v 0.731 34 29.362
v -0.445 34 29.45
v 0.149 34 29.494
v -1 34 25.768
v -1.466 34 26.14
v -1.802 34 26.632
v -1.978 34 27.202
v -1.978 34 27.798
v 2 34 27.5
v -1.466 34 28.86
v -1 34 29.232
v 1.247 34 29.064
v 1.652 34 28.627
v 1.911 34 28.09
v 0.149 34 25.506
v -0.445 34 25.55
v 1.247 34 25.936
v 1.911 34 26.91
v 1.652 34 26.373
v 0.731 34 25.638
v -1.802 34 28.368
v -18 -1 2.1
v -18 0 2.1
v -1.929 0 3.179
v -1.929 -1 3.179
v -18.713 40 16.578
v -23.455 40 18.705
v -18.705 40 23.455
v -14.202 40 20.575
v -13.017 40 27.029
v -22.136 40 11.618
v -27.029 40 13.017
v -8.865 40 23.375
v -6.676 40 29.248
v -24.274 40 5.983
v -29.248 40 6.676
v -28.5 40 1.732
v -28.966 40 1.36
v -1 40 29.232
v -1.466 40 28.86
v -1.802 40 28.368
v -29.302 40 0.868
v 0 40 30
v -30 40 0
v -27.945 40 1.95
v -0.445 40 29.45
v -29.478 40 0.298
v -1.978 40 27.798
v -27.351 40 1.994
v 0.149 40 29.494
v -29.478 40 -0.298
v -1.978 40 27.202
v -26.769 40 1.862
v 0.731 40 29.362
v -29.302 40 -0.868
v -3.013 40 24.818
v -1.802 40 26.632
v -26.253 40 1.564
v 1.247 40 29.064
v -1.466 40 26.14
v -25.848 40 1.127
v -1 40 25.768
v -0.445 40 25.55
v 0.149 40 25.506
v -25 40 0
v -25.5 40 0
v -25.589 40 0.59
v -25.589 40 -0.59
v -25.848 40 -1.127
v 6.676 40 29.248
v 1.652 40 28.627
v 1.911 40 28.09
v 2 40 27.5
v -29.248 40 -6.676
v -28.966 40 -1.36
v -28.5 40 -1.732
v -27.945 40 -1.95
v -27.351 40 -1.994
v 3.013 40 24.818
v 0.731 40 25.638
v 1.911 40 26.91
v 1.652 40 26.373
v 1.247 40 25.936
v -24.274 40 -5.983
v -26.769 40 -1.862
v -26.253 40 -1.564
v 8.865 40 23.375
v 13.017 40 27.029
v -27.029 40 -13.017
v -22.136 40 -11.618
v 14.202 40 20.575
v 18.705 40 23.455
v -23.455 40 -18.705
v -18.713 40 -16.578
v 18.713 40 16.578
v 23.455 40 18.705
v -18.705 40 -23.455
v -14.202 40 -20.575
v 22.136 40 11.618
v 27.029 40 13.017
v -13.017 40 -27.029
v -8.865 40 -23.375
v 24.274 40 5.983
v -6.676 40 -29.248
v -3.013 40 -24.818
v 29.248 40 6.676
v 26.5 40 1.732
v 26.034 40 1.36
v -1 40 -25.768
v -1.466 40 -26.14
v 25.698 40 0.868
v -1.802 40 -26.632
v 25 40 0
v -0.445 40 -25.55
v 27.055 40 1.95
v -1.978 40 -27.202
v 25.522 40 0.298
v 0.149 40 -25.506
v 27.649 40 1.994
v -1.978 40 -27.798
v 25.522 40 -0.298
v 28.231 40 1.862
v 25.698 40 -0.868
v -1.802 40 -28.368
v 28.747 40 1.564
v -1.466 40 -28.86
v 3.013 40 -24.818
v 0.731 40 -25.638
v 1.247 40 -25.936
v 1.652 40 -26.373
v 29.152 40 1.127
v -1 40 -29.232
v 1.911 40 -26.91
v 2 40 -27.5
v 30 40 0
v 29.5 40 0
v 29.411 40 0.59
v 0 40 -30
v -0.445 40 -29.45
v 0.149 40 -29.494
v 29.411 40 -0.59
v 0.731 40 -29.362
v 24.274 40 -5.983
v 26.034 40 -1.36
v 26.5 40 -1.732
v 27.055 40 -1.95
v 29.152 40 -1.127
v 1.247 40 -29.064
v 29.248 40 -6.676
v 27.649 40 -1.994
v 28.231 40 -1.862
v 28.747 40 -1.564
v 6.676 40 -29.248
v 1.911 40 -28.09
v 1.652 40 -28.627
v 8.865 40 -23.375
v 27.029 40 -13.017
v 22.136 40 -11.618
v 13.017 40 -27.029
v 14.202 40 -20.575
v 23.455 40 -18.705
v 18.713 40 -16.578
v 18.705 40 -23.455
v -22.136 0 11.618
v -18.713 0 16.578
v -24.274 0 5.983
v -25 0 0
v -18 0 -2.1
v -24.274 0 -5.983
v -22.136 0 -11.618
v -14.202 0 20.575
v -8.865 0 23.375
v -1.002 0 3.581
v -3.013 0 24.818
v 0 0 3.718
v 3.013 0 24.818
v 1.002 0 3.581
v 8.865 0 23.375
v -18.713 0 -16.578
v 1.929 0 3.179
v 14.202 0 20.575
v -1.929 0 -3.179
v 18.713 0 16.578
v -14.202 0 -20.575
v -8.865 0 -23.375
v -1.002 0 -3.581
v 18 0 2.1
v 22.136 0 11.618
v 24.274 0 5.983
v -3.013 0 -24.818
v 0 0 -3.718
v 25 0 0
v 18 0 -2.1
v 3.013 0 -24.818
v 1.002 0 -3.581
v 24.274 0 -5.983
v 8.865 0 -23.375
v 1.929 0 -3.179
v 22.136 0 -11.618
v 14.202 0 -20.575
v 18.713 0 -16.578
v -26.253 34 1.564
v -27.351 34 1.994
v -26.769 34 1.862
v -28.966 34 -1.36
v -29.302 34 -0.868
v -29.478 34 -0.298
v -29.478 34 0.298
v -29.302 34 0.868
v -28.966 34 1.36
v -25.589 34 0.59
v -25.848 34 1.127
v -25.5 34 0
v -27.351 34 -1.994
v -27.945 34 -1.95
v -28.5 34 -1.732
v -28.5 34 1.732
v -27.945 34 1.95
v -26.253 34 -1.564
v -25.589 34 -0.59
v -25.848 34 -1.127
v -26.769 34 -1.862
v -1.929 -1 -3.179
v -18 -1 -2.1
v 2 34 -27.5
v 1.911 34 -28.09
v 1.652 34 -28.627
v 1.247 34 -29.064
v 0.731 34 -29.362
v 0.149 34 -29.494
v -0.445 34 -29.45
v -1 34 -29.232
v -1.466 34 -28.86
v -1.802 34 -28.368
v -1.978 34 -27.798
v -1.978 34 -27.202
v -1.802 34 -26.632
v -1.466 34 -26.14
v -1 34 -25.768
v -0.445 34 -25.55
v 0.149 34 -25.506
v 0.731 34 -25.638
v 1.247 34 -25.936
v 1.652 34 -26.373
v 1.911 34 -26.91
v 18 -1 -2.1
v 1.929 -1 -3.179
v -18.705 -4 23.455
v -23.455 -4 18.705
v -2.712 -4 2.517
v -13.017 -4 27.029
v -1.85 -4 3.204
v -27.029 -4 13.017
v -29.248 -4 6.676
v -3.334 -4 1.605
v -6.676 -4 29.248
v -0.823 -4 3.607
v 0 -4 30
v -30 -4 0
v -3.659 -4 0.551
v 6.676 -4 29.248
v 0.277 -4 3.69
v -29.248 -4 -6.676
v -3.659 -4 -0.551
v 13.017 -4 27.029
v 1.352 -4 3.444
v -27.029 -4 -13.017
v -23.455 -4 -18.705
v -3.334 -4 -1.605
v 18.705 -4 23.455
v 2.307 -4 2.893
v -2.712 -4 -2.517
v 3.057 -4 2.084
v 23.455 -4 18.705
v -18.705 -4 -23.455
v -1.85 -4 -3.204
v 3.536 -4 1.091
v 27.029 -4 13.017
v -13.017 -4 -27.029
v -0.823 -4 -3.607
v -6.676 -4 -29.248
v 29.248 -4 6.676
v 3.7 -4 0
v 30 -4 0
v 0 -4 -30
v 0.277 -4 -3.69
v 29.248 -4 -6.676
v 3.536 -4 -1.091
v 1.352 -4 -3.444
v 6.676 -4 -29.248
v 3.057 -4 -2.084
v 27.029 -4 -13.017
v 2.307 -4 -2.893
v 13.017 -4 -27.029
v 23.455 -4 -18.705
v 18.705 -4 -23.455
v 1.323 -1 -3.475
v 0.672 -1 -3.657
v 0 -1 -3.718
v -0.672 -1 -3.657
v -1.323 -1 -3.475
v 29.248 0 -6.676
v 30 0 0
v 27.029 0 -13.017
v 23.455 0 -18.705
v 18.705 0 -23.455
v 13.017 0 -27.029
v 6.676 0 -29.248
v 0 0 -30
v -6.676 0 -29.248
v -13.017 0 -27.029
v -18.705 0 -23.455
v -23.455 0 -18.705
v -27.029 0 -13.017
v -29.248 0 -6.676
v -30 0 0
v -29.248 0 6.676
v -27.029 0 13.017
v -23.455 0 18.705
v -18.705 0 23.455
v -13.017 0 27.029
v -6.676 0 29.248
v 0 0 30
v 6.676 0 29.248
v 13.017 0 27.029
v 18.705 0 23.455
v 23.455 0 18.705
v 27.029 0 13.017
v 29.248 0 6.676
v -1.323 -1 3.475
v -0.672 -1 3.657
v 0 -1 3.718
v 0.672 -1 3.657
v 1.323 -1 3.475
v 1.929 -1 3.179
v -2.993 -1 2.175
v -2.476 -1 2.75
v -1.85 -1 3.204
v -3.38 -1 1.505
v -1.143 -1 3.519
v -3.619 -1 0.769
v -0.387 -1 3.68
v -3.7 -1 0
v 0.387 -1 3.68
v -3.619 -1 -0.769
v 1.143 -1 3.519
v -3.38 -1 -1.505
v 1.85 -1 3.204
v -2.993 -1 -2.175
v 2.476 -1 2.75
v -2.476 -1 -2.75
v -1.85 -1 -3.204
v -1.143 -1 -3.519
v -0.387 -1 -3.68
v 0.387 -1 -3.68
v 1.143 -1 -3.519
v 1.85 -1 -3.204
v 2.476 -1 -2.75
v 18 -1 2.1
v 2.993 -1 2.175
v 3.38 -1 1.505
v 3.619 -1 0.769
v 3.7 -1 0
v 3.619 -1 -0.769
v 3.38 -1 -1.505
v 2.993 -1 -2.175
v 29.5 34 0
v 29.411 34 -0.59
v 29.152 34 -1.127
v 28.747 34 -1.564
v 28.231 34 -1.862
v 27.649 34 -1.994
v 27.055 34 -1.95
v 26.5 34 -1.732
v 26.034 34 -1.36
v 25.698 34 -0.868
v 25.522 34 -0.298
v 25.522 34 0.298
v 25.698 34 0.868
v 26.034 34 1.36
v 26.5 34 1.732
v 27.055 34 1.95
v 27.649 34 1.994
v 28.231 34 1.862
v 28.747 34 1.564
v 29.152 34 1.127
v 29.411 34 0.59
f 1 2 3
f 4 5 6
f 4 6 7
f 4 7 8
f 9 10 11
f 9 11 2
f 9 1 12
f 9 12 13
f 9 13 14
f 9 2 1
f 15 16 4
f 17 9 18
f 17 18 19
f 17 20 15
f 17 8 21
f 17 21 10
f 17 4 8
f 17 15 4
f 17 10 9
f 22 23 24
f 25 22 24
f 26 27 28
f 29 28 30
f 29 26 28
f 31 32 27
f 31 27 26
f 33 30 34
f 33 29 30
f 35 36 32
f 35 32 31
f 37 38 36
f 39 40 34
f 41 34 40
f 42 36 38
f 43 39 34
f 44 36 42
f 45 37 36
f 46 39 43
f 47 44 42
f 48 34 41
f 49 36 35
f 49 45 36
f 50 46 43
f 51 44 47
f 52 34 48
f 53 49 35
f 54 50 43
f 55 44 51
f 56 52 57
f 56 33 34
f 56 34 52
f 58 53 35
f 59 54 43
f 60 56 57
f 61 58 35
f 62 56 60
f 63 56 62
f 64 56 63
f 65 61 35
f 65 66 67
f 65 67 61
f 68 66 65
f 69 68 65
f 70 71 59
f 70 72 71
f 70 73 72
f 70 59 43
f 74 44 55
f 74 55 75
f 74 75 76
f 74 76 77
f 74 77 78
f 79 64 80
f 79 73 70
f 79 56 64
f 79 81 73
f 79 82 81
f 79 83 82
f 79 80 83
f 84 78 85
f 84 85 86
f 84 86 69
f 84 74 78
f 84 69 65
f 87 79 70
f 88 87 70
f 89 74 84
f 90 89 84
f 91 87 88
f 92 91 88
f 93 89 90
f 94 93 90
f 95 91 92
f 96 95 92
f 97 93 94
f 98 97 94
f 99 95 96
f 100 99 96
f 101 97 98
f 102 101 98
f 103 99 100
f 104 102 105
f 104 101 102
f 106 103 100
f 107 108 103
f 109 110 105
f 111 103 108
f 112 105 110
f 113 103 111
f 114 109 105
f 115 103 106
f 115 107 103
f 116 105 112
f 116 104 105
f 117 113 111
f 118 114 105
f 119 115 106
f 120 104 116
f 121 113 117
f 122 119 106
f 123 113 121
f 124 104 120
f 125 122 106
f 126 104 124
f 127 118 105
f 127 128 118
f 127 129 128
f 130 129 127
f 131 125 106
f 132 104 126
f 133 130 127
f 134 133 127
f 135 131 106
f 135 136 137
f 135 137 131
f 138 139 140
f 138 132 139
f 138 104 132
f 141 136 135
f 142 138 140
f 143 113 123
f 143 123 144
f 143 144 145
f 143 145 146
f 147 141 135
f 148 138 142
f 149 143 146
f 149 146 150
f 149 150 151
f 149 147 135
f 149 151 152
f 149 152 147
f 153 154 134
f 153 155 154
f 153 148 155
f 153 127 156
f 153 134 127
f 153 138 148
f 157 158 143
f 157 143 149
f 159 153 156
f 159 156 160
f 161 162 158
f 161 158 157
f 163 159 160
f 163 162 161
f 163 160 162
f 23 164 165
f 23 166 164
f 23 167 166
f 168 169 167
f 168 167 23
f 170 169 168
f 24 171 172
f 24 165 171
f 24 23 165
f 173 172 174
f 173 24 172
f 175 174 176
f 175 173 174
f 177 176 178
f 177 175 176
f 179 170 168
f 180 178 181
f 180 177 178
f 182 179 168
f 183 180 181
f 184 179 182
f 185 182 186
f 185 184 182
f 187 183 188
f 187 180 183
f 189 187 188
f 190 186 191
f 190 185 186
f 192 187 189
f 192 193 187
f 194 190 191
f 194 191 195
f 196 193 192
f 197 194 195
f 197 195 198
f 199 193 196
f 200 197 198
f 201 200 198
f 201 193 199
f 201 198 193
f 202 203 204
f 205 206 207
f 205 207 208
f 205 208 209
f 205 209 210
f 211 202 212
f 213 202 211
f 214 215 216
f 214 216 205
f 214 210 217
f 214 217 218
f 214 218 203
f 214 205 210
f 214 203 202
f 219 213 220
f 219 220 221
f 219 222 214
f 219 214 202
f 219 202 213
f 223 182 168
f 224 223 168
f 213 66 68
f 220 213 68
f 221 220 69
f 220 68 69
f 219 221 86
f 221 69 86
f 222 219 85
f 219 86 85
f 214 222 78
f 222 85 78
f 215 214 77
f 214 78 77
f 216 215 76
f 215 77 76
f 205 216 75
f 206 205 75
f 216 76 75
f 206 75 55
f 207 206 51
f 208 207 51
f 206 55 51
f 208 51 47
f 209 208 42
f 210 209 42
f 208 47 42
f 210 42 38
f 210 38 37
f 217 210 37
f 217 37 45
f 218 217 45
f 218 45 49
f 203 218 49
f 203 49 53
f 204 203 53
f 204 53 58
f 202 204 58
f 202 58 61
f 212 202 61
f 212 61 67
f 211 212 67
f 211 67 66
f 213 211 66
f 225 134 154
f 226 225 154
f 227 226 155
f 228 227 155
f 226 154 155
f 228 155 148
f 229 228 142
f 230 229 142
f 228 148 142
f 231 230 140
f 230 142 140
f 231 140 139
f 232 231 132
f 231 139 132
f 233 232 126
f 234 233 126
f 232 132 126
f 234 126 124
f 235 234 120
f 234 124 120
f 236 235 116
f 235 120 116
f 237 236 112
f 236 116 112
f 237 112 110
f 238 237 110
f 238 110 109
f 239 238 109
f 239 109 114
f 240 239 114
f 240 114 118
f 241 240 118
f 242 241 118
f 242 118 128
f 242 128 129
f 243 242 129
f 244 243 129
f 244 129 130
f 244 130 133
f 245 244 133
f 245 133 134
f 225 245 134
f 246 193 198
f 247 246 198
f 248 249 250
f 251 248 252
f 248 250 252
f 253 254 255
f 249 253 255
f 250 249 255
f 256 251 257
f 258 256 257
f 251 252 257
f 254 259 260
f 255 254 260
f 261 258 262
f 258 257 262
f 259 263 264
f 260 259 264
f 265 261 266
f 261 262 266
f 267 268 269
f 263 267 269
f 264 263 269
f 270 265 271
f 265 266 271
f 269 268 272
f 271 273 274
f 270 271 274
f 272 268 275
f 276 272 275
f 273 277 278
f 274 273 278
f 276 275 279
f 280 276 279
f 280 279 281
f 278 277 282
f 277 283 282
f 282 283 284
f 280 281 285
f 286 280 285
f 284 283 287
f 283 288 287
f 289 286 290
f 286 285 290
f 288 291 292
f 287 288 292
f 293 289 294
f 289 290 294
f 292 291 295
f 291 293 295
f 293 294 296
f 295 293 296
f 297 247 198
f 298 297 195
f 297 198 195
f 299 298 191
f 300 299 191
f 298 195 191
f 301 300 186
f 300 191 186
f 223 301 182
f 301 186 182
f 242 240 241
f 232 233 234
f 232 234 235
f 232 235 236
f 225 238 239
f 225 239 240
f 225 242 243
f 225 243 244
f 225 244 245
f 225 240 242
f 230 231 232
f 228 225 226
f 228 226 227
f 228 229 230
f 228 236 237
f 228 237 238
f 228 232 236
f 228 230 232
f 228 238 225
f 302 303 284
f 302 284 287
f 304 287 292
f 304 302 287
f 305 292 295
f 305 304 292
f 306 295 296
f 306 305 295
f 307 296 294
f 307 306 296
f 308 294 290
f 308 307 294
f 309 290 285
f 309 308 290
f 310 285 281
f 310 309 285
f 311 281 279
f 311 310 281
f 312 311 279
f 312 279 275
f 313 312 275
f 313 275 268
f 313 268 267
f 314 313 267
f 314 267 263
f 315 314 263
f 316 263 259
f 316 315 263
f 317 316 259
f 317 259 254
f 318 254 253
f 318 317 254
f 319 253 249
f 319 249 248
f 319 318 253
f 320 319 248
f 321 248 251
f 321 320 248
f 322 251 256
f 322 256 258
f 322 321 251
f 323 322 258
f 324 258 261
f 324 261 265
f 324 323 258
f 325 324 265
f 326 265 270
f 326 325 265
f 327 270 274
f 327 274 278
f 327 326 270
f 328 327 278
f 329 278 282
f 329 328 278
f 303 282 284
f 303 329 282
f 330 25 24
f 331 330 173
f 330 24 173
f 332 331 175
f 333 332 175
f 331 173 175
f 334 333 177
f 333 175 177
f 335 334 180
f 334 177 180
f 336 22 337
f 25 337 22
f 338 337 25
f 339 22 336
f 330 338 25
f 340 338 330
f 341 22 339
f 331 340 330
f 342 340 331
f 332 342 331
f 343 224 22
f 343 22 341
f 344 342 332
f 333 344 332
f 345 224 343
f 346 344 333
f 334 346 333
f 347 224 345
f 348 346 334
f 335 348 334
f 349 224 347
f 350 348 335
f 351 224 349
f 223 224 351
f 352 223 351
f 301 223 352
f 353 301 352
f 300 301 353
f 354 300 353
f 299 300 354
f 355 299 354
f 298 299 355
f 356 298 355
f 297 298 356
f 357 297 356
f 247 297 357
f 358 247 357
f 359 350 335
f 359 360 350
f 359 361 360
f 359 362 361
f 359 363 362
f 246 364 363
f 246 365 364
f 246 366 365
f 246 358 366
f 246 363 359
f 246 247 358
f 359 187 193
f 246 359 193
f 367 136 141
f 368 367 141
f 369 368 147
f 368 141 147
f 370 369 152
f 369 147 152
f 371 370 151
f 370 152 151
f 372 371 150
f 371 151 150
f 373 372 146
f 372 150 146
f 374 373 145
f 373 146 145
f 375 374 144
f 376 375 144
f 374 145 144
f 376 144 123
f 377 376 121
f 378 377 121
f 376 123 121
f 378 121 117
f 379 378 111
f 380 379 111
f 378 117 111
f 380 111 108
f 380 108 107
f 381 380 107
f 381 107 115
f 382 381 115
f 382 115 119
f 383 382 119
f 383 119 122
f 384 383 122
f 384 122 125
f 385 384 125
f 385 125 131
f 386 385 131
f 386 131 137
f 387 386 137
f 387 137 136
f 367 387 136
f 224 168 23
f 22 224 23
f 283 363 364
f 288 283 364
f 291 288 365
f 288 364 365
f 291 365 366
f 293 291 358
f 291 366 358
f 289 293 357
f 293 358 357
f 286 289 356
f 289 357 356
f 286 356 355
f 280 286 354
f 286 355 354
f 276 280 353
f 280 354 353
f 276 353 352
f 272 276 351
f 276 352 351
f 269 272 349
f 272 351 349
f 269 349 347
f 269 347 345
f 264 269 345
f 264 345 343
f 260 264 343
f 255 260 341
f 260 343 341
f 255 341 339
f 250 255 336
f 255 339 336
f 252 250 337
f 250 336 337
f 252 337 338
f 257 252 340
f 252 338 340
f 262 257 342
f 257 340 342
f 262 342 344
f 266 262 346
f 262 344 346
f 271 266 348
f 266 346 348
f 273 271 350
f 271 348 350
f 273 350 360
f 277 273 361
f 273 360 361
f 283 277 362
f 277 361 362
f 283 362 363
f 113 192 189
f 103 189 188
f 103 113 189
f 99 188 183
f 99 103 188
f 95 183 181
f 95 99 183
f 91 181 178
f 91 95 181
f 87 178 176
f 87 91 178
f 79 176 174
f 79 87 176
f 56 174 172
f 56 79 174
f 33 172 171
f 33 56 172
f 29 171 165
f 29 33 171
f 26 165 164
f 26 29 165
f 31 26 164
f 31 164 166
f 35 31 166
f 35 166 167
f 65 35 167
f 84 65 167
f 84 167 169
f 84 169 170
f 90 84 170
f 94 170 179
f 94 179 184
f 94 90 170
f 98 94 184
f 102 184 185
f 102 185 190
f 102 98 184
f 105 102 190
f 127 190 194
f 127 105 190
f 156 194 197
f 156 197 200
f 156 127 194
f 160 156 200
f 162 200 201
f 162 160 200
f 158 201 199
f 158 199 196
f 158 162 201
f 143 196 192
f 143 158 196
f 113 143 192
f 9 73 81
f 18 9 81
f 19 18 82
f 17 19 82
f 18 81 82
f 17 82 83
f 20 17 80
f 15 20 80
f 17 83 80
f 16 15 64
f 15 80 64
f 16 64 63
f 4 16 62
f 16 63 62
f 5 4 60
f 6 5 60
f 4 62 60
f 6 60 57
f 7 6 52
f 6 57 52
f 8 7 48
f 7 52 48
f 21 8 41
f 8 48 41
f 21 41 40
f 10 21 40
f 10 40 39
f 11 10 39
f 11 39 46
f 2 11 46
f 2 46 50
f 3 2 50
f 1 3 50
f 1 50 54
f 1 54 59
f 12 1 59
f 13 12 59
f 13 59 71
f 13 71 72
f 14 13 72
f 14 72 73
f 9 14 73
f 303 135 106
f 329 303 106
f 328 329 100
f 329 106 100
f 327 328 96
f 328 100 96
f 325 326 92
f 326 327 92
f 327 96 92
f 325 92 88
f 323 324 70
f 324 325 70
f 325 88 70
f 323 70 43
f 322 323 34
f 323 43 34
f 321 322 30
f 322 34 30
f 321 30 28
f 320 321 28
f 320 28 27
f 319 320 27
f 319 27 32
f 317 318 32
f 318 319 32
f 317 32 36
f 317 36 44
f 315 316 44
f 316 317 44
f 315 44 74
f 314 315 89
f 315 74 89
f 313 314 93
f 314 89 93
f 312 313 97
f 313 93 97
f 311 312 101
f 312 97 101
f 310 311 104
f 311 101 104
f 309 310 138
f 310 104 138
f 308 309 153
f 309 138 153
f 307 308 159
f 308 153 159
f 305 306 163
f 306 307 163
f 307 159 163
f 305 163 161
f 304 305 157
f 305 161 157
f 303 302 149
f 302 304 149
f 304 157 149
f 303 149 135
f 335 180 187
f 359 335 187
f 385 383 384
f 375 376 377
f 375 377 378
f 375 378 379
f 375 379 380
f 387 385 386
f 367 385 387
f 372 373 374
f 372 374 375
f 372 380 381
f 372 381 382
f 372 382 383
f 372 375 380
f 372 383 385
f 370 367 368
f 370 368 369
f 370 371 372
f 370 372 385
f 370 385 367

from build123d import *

# Parameters (mm, degrees)
CROQUIS2_R              = 30
SALIENTE_EXTRUIR1_DEPTH = 4
CORTAR_EXTRUIR1_DEPTH   = 1
CROQUIS3_R              = 3.7
CORTAR_EXTRUIR2_DEPTH   = 3
CROQUIS5_W              = 5
CROQUIS5_H              = 80
CROQUIS6_R              = 2
CORTAR_EXTRUIR3_DEPTH   = 46
CROQUIS7_W              = 60
CROQUIS7_H              = 40
CORTAR_EXTRUIR4_DEPTH   = 30


with BuildPart() as part:
    # Croquis2 → Saliente-Extruir1 (new body)
    with BuildSketch(Plane(origin=(0, 0, 0), x_dir=(1, 0, 0), z_dir=(0, 1, 0))):
        Circle(CROQUIS2_R)
    extrude(amount=-SALIENTE_EXTRUIR1_DEPTH)

    # Croquis1 → Cortar-Extruir1 (cut)
    with BuildSketch(Plane(origin=(0, 0, 0), x_dir=(1, 0, 0), z_dir=(0, 1, 0))):
        with BuildLine():
            Line((18, -2.1), (18, 2.1))
            Line((18, 2.1), (1.92939966, 3.178620376))
            ThreePointArc((1.92939966, 3.178620376), (0, 3.718361271), (-1.92939966, 3.178620376))
            Line((-1.92939966, 3.178620376), (-18, 2.1))
            Line((-18, 2.1), (-18, -2.1))
            Line((-18, -2.1), (-1.92939966, -3.178620376))
            ThreePointArc((-1.92939966, -3.178620376), (0, -3.718361271), (1.92939966, -3.178620376))
            Line((1.92939966, -3.178620376), (18, -2.1))
        make_face()
    extrude(amount=-CORTAR_EXTRUIR1_DEPTH, mode=Mode.SUBTRACT)

    # Croquis3 → Cortar-Extruir2 (cut)
    with BuildSketch(Plane(origin=(0, -1, 0), x_dir=(1, 0, 0), z_dir=(0, 1, 0))):
        Circle(CROQUIS3_R)
    extrude(amount=-CORTAR_EXTRUIR2_DEPTH, mode=Mode.SUBTRACT)

    # Croquis5 → Revolución1 (revolve)
    with BuildSketch(Plane.XY):
        with Locations((27.5, 40)):
            Rectangle(CROQUIS5_W, CROQUIS5_H)
    revolve(axis=Axis((0, 80, 0), (0, -1, 0)))

    # Croquis6 → Cortar-Extruir3 (cut)
    with BuildSketch(Plane(origin=(0, 80, 0), x_dir=(1, 0, 0), z_dir=(0, 1, 0))):
        with Locations((27.5, 0)):
            Circle(CROQUIS6_R)
        with Locations((0, -27.5)):
            Circle(CROQUIS6_R)
        with Locations((-27.5, 0)):
            Circle(CROQUIS6_R)
        with Locations((0, 27.5)):
            Circle(CROQUIS6_R)
    extrude(amount=-CORTAR_EXTRUIR3_DEPTH, mode=Mode.SUBTRACT)

    # Croquis7 → Cortar-Extruir4 (cut)
    with BuildSketch(Plane.XY):
        with Locations((0, 60)):
            Rectangle(CROQUIS7_W, CROQUIS7_H)
    cortar_extruir4 = extrude(amount=-CORTAR_EXTRUIR4_DEPTH, mode=Mode.SUBTRACT)

    # Simetría1: Cortar-Extruir4 across plane
    add(cortar_extruir4.mirror(Plane.XY), mode=Mode.SUBTRACT)


solid = part.part
